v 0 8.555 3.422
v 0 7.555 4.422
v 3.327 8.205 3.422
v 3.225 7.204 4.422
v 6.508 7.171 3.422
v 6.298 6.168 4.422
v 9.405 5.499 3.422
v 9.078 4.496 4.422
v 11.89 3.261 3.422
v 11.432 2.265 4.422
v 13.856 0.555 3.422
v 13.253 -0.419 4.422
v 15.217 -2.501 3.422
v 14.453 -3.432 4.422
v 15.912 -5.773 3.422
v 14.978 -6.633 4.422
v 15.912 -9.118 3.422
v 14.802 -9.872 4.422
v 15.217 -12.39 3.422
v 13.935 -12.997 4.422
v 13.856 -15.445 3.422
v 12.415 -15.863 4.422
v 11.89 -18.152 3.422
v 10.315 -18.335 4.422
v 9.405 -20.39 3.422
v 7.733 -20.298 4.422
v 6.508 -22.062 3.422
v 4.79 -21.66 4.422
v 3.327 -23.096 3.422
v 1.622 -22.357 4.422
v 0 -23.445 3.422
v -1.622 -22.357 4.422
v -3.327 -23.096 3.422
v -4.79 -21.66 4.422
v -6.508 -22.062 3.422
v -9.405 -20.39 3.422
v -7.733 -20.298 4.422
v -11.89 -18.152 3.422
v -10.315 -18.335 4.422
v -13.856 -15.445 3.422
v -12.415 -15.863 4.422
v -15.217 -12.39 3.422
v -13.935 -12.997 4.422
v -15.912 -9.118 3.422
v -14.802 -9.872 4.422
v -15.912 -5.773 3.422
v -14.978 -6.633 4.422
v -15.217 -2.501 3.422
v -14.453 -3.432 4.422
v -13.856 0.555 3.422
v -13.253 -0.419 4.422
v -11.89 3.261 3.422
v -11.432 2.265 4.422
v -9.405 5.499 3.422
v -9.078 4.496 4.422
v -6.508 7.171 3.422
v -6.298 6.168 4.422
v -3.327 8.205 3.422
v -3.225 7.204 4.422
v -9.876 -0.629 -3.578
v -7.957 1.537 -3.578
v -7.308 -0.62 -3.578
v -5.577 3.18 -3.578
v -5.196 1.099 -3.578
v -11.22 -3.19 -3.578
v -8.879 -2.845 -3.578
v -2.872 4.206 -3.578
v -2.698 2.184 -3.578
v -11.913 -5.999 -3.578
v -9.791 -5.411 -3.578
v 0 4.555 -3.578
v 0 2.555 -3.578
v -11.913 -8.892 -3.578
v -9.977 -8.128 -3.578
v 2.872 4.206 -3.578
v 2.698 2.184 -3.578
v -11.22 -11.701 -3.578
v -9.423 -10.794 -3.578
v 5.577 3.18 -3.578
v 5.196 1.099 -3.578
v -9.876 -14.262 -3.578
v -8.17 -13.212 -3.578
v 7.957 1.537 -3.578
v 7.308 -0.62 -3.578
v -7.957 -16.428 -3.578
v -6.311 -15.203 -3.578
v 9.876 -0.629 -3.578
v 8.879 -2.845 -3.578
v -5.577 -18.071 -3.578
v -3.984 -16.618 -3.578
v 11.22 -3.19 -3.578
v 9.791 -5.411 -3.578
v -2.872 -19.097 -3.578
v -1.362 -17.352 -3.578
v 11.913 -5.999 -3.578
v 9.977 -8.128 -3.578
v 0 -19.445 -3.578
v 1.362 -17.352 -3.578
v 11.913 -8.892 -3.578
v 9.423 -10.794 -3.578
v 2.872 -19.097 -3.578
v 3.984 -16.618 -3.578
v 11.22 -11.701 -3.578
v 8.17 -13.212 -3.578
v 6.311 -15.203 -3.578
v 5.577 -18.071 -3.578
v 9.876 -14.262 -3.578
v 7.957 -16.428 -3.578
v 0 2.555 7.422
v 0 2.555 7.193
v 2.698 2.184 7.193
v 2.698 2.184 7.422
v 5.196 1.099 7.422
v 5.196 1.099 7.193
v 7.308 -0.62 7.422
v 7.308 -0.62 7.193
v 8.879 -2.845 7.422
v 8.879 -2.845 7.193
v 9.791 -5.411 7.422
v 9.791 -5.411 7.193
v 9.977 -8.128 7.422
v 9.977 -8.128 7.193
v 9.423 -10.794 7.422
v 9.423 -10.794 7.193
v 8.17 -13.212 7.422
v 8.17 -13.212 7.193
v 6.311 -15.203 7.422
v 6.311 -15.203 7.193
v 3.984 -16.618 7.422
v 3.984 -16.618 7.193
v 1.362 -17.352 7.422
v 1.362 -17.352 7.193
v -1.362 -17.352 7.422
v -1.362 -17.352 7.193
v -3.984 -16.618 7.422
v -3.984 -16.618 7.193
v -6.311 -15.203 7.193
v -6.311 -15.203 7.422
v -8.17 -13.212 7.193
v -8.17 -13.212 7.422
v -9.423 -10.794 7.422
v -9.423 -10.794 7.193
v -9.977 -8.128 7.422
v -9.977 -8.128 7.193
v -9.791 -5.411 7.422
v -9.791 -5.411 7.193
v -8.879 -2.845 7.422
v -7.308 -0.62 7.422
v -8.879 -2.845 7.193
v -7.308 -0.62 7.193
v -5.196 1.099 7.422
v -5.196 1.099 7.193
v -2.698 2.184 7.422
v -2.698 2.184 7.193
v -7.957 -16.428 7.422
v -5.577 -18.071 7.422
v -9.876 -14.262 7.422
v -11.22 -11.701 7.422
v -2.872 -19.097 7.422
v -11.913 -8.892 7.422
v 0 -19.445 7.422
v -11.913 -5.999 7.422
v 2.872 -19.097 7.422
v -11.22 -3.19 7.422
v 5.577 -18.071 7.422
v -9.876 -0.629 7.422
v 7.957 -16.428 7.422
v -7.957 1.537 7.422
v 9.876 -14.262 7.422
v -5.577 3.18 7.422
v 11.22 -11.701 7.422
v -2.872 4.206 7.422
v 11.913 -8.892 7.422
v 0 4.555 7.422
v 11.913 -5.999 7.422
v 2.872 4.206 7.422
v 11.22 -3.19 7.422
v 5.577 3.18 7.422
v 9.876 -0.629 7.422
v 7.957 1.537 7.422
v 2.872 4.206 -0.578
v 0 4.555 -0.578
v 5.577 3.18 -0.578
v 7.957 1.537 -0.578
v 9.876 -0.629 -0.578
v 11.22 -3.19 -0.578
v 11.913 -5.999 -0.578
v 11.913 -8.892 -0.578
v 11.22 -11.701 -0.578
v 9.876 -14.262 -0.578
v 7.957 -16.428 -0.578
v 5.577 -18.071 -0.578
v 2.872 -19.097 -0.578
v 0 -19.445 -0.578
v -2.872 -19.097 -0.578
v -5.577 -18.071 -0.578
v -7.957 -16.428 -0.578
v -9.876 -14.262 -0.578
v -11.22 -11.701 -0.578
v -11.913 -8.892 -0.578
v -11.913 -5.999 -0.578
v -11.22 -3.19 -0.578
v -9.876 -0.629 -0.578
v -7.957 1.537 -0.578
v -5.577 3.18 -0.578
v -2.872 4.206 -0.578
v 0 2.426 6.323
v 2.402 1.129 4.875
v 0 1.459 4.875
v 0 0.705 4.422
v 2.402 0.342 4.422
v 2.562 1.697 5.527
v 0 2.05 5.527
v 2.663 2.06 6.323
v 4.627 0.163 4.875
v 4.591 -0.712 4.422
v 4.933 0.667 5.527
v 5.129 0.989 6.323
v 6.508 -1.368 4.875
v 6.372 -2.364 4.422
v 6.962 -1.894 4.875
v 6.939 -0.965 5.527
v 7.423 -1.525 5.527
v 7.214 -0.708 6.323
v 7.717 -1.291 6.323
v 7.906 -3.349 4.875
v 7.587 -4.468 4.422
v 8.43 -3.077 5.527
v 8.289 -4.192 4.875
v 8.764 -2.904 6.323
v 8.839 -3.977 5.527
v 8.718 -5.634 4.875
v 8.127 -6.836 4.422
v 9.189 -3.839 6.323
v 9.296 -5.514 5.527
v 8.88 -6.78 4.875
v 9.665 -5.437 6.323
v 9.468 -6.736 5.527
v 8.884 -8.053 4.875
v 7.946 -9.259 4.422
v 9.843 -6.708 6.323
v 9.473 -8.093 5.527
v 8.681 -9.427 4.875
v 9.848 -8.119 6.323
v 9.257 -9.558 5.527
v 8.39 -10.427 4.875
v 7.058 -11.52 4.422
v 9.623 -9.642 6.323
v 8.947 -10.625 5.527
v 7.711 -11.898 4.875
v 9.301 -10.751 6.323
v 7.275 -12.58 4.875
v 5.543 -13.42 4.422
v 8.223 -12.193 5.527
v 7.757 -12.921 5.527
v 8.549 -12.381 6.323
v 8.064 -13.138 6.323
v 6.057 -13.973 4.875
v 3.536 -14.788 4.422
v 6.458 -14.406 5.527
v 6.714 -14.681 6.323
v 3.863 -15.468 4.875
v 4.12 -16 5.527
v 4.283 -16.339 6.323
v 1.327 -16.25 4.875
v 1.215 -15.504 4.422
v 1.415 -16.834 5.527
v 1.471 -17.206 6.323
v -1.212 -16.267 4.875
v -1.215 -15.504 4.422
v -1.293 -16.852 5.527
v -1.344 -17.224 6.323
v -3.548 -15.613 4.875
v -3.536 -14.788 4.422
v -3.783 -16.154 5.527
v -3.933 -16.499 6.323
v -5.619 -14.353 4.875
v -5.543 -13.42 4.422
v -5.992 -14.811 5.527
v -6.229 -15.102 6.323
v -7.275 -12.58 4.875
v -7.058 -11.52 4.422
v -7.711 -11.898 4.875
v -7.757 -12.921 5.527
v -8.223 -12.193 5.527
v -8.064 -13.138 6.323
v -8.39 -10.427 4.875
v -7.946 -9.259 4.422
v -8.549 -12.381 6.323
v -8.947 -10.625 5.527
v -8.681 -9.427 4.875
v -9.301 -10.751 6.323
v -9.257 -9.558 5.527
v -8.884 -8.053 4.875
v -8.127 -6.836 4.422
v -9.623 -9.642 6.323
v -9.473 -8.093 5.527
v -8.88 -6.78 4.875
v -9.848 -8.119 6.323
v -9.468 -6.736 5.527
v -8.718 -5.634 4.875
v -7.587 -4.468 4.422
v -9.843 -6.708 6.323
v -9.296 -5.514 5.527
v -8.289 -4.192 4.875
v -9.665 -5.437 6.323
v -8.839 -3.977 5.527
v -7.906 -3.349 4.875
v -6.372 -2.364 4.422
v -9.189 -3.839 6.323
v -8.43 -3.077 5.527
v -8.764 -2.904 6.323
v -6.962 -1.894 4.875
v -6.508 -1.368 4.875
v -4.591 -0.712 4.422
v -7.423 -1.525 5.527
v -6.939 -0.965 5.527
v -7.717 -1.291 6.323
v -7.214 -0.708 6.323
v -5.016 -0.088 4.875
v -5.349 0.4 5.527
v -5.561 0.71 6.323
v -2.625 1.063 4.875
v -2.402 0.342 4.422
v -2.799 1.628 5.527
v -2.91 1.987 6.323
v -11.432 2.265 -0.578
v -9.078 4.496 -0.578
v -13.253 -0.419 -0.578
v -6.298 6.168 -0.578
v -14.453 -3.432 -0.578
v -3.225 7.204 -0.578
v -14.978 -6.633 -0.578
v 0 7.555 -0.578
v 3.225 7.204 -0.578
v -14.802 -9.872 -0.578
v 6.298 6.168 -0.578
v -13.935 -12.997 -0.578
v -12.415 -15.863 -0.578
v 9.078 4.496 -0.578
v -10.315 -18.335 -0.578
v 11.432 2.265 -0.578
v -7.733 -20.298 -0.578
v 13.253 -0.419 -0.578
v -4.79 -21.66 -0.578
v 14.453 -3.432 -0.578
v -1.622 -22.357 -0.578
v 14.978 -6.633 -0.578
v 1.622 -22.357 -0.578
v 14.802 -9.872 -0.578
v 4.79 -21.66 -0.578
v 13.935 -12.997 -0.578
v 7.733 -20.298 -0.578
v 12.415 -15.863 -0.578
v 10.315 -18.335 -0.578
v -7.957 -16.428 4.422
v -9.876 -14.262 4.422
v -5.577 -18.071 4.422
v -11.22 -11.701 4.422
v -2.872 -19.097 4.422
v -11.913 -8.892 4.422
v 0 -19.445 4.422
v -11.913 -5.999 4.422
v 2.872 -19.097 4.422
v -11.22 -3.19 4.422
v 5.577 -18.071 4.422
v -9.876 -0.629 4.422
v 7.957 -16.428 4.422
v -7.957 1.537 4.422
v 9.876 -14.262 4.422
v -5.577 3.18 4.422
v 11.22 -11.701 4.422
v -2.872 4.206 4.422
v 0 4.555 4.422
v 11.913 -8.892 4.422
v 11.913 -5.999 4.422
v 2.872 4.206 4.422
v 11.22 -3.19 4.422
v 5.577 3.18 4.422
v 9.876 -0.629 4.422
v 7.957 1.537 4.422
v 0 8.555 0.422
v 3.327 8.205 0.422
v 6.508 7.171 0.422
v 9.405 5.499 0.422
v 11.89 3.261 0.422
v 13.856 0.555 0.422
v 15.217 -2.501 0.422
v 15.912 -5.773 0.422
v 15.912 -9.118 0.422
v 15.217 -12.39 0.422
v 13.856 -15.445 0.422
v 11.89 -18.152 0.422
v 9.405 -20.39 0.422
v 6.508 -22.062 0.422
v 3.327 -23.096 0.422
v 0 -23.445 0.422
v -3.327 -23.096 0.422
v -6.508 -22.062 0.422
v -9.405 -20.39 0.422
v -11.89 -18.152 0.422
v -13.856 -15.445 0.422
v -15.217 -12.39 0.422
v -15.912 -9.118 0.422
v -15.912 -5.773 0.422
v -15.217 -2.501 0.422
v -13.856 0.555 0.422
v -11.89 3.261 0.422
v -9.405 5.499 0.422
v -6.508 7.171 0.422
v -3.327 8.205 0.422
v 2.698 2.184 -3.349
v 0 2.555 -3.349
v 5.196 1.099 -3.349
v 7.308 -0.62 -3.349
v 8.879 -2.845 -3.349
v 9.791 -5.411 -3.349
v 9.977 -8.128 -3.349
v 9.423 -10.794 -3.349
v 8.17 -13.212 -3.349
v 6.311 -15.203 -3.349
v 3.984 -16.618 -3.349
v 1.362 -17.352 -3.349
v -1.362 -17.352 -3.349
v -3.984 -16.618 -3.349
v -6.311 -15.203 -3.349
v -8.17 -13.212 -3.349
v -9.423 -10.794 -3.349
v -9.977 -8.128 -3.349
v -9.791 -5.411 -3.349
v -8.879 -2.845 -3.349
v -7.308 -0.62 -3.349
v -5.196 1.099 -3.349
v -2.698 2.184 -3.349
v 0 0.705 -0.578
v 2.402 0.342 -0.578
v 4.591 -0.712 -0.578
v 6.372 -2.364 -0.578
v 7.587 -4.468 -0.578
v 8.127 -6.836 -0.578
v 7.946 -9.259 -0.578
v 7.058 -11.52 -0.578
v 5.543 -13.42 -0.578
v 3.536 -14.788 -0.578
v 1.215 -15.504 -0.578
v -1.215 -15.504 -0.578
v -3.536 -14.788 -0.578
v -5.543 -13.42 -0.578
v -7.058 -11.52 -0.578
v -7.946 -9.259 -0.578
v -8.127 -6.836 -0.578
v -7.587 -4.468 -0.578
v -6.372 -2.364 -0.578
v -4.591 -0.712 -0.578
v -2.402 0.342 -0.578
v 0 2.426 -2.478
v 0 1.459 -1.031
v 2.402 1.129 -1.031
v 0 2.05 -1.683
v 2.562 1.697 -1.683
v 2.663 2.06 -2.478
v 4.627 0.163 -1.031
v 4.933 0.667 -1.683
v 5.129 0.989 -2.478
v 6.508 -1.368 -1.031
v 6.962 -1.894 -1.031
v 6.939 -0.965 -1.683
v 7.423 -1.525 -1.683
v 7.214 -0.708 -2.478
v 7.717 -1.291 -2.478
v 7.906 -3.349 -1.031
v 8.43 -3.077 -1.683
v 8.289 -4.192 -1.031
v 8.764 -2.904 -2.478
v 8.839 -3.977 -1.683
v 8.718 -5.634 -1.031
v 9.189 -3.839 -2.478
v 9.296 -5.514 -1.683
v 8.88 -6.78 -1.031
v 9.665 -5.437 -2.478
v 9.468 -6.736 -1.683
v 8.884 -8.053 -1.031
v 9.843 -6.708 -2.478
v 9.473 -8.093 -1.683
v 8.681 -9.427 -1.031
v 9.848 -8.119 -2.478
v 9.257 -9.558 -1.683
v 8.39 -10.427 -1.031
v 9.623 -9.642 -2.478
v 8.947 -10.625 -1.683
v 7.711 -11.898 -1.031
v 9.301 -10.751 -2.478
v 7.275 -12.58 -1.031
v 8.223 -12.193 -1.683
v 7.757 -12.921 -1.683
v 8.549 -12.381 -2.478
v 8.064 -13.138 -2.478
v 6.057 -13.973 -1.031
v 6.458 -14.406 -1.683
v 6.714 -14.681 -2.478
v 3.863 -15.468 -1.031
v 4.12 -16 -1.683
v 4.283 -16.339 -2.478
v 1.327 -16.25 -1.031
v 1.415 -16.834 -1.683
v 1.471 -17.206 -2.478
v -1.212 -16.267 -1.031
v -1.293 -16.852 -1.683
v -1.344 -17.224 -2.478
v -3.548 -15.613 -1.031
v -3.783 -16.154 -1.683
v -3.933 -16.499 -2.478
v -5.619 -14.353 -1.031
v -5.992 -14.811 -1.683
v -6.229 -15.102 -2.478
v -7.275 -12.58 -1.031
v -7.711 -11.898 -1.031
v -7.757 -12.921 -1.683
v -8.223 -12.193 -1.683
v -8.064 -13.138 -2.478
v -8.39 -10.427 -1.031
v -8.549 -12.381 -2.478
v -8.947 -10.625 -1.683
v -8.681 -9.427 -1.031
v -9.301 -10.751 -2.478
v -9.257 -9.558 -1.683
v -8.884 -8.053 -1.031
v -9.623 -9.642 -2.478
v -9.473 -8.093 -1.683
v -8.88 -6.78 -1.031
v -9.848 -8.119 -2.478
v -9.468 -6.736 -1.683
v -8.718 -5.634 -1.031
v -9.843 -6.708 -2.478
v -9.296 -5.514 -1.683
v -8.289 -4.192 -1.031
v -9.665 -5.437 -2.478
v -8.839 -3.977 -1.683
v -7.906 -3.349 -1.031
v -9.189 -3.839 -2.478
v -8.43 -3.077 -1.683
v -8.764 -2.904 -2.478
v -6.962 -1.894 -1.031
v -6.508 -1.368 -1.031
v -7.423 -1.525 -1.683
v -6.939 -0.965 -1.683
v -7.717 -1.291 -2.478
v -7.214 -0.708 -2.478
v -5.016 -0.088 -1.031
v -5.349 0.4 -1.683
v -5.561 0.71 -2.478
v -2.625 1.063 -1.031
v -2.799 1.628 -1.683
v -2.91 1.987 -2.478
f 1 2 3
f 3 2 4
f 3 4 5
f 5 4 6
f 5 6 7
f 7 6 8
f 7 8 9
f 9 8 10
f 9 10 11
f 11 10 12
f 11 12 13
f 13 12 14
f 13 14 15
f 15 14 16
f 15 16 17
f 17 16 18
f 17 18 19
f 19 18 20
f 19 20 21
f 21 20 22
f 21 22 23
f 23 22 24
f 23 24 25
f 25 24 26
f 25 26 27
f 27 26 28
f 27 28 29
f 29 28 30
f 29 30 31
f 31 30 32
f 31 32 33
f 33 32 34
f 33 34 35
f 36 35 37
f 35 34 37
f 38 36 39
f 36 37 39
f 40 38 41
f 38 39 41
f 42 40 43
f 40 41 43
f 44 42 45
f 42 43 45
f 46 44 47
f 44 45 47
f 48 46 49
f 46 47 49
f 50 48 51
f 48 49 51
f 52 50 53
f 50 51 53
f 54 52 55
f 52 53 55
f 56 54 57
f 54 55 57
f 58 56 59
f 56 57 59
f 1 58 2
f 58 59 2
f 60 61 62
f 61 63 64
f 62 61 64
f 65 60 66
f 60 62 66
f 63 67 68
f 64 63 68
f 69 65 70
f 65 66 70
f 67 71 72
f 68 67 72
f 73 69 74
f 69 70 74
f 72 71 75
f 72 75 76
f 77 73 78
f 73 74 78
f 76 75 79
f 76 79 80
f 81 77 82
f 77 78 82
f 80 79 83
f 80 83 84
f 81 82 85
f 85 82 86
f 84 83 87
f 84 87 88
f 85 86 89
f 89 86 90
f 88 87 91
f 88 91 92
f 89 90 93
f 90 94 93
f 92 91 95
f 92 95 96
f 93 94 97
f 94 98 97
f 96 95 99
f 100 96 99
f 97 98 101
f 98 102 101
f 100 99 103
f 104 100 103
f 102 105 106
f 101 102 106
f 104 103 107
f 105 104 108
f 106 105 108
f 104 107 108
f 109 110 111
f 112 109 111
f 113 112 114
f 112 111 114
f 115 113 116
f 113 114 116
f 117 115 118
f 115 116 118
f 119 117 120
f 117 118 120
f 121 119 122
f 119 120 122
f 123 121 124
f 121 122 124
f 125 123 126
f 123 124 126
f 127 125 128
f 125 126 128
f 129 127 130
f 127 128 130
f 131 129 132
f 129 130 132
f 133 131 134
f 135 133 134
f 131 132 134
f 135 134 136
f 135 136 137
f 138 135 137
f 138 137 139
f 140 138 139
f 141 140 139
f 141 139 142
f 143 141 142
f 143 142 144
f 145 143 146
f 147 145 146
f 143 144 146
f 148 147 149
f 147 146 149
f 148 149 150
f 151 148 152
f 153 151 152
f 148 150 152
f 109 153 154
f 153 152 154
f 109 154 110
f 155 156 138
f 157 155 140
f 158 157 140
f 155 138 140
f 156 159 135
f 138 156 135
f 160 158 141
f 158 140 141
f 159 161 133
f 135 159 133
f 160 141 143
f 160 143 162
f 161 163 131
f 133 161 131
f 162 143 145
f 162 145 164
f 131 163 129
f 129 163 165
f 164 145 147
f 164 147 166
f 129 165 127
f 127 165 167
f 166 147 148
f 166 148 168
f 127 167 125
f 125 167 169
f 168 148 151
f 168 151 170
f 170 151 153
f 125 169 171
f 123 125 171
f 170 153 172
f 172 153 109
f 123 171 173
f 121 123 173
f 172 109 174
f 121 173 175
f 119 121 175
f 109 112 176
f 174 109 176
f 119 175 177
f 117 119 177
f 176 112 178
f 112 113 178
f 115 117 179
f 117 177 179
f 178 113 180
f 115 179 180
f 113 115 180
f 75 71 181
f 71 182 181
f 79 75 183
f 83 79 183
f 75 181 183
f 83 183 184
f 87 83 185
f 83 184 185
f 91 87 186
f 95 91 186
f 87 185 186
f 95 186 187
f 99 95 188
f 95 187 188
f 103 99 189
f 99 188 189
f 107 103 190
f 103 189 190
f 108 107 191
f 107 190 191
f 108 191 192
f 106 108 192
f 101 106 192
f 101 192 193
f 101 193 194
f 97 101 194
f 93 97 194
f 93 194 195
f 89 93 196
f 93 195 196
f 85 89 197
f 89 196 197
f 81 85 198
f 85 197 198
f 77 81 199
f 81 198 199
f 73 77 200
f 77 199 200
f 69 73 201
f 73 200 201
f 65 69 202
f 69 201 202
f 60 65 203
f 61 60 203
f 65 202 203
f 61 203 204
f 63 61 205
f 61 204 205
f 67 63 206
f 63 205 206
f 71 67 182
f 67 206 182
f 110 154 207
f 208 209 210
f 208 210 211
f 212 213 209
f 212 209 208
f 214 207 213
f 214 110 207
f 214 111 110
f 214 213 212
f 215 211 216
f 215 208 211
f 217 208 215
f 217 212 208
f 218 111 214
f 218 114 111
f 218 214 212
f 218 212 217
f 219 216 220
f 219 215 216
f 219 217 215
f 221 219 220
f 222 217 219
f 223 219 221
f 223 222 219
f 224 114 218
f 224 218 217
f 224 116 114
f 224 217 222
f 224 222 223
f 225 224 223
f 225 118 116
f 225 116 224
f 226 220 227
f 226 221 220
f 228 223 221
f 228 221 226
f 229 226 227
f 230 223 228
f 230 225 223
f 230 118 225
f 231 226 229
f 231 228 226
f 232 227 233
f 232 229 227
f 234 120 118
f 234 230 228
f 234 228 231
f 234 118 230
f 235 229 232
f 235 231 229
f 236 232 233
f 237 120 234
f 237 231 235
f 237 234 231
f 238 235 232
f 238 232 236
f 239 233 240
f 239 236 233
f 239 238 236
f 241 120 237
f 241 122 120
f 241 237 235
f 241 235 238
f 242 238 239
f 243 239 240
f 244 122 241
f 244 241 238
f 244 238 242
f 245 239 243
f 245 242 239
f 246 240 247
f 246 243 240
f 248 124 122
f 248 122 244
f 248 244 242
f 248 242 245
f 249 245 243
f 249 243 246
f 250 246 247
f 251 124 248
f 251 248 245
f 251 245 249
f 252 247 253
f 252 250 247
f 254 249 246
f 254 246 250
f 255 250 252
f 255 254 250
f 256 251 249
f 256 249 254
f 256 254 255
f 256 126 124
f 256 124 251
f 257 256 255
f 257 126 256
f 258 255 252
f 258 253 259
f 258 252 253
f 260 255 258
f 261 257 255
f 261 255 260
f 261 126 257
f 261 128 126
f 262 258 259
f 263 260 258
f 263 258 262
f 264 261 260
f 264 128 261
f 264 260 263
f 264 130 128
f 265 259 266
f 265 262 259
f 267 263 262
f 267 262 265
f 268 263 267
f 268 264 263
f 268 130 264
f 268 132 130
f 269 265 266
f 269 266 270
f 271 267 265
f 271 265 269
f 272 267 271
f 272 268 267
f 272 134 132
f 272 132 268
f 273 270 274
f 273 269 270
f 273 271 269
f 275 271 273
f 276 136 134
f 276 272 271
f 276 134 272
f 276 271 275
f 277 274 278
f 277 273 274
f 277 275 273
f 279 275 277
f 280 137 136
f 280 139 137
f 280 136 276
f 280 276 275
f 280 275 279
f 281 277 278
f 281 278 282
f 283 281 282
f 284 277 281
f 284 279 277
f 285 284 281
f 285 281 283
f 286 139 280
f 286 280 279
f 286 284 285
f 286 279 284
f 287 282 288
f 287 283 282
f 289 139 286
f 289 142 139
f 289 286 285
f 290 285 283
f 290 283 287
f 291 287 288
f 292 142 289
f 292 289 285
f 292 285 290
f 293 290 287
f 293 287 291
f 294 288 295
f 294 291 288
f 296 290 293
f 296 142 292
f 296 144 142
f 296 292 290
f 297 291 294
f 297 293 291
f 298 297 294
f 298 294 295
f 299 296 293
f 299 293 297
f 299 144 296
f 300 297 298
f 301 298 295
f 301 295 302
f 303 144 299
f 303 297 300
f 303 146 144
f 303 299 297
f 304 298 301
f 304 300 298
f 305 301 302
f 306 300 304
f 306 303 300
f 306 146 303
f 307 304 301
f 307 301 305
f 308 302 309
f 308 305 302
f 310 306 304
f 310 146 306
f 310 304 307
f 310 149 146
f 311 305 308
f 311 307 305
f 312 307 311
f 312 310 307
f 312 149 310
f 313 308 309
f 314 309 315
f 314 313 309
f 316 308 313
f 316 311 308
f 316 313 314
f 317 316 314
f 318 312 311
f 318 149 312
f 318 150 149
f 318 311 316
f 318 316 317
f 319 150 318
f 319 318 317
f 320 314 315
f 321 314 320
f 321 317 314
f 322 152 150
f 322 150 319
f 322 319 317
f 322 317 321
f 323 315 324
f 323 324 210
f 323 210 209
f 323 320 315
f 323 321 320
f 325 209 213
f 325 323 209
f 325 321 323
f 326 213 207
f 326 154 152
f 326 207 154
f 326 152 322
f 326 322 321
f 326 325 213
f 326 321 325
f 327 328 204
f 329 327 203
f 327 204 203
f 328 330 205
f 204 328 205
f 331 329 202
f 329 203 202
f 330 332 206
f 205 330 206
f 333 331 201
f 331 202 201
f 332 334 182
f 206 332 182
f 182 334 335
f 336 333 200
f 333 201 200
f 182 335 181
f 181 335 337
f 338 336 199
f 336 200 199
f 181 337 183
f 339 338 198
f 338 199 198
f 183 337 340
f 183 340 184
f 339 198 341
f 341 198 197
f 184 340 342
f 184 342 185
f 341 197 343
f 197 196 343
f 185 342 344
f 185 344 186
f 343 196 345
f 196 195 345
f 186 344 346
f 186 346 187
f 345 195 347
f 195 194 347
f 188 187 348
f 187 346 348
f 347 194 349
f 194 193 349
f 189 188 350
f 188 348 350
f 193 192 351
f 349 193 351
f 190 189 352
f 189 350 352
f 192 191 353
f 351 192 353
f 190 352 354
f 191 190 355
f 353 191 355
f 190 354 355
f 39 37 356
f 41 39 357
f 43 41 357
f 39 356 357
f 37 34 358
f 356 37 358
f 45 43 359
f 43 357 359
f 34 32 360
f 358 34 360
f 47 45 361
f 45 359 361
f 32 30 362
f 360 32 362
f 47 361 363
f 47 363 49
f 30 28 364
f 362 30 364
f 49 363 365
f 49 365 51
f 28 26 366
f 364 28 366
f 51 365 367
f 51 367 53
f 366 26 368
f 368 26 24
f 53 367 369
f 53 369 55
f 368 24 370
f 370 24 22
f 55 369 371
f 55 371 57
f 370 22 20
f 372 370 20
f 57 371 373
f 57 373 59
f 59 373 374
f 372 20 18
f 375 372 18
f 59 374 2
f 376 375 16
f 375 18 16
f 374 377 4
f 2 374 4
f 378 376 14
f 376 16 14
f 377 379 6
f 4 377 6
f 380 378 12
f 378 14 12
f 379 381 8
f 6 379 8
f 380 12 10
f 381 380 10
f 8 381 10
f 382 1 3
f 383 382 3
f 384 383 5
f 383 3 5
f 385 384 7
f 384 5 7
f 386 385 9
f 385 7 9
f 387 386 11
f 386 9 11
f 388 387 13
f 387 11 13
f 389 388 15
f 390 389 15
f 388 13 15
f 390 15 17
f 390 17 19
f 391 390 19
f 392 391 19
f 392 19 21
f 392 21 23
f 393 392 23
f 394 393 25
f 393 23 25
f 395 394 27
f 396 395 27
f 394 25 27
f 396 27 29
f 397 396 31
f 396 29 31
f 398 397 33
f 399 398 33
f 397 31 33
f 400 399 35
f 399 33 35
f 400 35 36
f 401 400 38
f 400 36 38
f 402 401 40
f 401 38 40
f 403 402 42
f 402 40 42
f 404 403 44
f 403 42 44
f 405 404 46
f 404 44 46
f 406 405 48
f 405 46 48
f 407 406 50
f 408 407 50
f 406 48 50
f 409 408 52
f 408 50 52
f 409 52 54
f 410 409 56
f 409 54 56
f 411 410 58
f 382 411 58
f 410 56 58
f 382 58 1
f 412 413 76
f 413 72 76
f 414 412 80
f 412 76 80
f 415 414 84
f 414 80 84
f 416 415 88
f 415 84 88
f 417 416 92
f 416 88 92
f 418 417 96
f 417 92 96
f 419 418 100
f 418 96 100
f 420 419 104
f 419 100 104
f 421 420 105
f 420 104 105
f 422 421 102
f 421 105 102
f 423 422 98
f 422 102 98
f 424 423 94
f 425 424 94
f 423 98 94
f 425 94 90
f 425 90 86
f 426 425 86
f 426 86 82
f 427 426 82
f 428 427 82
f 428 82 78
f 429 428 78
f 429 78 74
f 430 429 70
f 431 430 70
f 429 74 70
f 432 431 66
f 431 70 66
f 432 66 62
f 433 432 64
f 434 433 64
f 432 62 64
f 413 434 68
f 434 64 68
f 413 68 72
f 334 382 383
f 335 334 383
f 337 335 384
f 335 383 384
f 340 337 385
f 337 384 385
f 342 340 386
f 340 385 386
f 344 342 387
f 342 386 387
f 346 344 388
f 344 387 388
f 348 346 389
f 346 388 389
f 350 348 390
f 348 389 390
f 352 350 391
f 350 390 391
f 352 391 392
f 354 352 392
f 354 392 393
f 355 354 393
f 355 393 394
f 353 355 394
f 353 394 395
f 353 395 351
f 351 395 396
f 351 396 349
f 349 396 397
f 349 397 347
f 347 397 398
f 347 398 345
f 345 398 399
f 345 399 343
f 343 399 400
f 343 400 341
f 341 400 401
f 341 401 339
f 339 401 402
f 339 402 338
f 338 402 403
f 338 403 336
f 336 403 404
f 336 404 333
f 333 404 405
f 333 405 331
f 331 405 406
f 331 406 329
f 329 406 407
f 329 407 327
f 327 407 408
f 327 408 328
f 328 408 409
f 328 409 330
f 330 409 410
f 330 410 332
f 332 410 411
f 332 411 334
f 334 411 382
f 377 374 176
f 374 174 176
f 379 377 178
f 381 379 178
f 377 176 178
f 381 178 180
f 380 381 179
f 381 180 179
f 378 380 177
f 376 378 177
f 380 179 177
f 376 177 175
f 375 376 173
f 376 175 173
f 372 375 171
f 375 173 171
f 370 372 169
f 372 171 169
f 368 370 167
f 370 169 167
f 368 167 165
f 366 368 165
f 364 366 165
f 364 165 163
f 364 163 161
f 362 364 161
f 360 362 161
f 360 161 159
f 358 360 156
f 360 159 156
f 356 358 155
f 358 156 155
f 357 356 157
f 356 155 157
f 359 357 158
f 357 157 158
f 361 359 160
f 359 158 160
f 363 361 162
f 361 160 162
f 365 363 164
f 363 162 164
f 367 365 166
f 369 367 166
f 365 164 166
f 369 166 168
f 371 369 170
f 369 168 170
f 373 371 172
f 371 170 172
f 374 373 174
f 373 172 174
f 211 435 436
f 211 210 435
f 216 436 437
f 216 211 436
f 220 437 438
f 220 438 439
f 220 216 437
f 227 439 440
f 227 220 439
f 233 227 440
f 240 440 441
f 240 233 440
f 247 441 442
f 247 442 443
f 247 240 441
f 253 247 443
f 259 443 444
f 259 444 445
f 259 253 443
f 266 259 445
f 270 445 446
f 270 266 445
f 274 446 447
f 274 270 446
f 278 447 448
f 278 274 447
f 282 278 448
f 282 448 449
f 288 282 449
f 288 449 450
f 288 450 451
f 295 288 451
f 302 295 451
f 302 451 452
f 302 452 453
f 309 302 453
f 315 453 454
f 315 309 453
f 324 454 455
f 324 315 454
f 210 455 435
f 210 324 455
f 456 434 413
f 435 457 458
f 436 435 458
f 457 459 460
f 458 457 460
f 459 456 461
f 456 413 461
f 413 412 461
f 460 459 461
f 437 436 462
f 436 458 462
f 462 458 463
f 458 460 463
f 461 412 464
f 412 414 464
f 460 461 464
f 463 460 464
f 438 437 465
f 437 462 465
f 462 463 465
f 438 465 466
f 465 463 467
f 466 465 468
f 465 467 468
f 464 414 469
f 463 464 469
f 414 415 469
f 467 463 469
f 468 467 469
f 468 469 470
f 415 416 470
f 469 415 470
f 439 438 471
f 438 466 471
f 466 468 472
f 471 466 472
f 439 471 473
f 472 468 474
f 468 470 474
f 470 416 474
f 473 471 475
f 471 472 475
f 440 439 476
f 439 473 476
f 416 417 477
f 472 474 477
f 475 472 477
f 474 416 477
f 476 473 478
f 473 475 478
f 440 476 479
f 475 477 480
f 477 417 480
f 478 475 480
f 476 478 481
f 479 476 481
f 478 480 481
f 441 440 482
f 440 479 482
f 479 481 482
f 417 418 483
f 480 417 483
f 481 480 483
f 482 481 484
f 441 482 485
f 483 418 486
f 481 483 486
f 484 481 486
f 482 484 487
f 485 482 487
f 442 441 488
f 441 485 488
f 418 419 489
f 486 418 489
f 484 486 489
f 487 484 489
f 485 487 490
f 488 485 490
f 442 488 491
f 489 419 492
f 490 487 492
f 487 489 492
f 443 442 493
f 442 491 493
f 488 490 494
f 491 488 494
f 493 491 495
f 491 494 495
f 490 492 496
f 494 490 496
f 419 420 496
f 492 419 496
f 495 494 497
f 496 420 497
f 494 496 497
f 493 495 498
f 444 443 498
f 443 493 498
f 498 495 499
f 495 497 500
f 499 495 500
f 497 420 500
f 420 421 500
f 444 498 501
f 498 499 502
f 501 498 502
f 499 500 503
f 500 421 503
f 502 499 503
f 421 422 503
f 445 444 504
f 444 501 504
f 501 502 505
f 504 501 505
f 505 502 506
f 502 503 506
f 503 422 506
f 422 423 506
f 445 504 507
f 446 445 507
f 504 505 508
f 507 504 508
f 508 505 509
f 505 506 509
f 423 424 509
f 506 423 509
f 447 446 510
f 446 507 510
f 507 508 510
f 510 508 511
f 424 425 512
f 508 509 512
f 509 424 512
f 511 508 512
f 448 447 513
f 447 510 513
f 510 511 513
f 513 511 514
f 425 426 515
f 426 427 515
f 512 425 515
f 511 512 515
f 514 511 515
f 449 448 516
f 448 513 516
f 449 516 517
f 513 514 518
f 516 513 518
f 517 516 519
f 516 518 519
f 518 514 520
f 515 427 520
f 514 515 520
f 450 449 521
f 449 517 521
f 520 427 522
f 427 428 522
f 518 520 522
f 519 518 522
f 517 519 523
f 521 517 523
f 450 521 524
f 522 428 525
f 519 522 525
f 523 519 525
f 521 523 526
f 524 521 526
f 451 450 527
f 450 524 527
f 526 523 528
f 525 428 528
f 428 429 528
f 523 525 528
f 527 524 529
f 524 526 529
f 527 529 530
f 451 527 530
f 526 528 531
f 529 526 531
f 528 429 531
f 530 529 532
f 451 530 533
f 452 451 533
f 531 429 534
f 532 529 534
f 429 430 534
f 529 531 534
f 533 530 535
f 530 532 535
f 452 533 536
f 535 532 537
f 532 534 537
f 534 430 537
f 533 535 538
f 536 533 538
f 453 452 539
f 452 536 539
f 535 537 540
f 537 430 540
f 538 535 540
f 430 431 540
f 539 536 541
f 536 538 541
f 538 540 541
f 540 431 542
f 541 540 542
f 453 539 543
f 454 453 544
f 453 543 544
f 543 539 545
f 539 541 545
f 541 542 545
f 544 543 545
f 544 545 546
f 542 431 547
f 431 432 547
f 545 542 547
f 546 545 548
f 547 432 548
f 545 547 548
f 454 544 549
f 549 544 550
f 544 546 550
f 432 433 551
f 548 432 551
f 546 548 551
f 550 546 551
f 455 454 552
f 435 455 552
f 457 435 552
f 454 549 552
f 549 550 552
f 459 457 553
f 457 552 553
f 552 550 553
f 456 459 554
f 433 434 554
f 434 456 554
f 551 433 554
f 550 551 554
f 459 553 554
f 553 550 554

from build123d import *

# Parameters (mm, degrees)
F0_W    = 1.85
F0_H    = 5
F3_SIZE = 1


# Not quite as in the source:
# - a fillet or chamfer that OpenCascade refuses, or shapes differently, is made with other operations: its cross-section is extruded or revolved along the edge and cut away or added


with BuildPart() as f1:
    # F0 (on Right) → F1 (revolve)
    with BuildSketch(Plane.YZ):
        with Locations((1.6295755848, 1.9221331838)):
            Rectangle(F0_W, F0_H)
        Polygon((2.5545755848, 7.4221331838), (2.5545755848, 4.4221331838), (2.5545755848, -0.5778668162), (2.5545755848, -3.5778668162), (4.5545755848, -3.5778668162), (4.5545755848, -0.5778668162), (8.5545755848, -0.5778668162), (8.5545755848, 4.4221331838), (4.5545755848, 4.4221331838), (4.5545755848, 7.4221331838), align=None)
    revolve(axis=Axis((0, -7.4454244152, 1.9221331838), (0, 0, -1)))

    # F2: fillet of radius 3 on 2 edges, made by hand

    # F2_s1 → F2_t2 (revolve)
    with BuildSketch(Plane.YZ):
        with BuildLine():
            ThreePointArc((0.7045755848, 4.4221331838), (2.0495705748, 5.5271302594), (2.5545755848, 7.1929633843))
            Line((2.5545755848, 7.1929633843), (2.5545755848, 4.4221331838))
            Line((2.5545755848, 4.4221331838), (0.7045755848, 4.4221331838))
        make_face()
    revolve(axis=Axis((0, -7.4454244152, 4.4221331838), (0, 0, -1)))

    # F2_s3 → F2_t4 (revolve)
    with BuildSketch(Plane.YZ):
        with BuildLine():
            ThreePointArc((0.7045755848, -0.5778668162), (2.0495705748, -1.6828638918), (2.5545755848, -3.3486970167))
            Line((2.5545755848, -3.3486970167), (2.5545755848, -0.5778668162))
            Line((2.5545755848, -0.5778668162), (0.7045755848, -0.5778668162))
        make_face()
    revolve(axis=Axis((0, -7.4454244152, -0.5778668162), (0, 0, -1)))

    # F3
    f3_edges = [f1.edges().sort_by_distance(p)[0] for p in [
        (0, -23.445424, -0.577867),
        (0, -23.445424, 4.422133),
    ]]
    chamfer(f3_edges, length=F3_SIZE)


solid = f1.part
